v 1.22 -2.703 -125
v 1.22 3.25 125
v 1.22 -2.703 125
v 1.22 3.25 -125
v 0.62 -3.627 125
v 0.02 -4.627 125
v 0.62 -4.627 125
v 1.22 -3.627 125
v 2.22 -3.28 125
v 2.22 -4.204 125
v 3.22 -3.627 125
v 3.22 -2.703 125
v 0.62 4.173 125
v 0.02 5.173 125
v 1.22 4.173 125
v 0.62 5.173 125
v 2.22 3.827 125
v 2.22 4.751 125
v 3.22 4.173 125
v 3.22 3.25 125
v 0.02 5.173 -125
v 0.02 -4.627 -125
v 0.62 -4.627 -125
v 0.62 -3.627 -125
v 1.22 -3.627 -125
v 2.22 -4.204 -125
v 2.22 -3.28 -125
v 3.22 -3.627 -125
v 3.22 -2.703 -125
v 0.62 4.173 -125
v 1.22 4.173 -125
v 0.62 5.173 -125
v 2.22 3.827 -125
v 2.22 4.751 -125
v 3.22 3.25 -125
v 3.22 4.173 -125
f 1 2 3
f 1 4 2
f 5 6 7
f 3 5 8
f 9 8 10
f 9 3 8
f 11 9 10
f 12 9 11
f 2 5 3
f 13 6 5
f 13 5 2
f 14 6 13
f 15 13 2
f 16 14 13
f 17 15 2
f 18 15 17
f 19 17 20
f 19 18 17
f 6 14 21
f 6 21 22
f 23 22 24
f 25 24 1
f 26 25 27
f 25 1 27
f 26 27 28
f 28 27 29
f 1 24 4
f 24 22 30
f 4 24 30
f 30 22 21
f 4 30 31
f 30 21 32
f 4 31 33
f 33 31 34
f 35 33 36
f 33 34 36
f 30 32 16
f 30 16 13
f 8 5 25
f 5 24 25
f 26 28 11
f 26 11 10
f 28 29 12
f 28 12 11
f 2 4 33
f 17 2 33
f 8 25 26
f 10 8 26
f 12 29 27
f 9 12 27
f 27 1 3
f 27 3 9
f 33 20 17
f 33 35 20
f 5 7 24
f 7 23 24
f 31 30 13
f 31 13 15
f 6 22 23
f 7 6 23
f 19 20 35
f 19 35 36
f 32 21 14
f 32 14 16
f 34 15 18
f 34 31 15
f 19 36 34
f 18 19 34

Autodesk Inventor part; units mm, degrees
ref_plane "YZ Plane" through (0, 0, 0) normal (1, 0, 0) x (0, 1, 0)
ref_plane "XZ Plane" through (0, 0, 0) normal (0, 1, 0) x (-1, 0, 0)
ref_plane "XY Plane" through (0, 0, 0) normal (0, 0, 1) x (1, 0, 0)
sketch "Sketch1" plane through (0, 0, 0) normal (0, 0, 1) x (1, 0, 0)
  line L0 (0.0202, 5.1733) -> (0.0202, -4.6267)
  line L1 (0.6202, 5.1733) -> (0.6202, 4.1733)
  line L2 (1.2202, 3.2495) -> (1.2202, -2.703)
  line L3 (0.6202, 4.1733) -> (1.2202, 4.1733)
  line L4 (0.0202, 5.1733) -> (0.6202, 5.1733)
  line L5 (1.2202, 4.1733) -> (2.2202, 4.7506)
  line L6 (1.2202, 3.2495) -> (2.2202, 3.8268)
  line L7 (3.2202, 4.1733) -> (2.2202, 4.7506)
  line L8 (3.2202, 3.2495) -> (2.2202, 3.8268)
  line L9 (3.2202, 3.2495) -> (3.2202, 4.1733)
  line L10 (0.6202, -4.6267) -> (0.6202, -3.6267)
  line L11 (0.6202, -3.6267) -> (1.2202, -3.6267)
  line L12 (0.0202, -4.6267) -> (0.6202, -4.6267)
  line L13 (1.2202, -3.6267) -> (2.2202, -4.2041)
  line L14 (1.2202, -2.703) -> (2.2202, -3.2803)
  line L15 (3.2202, -3.6267) -> (2.2202, -4.2041)
  line L16 (3.2202, -2.703) -> (2.2202, -3.2803)
  line L17 (3.2202, -2.703) -> (3.2202, -3.6267)
  point P0 (0, 0)
  dimension "d0" = 120
  dimension "d1" = 120
  dimension "d2" = 90
  dimension "d3" = 60
  dimension "d4" = 2
  dimension "d5" = 2.6
  dimension "d6" = 3.2
  dimension "d7" = 0.8
  dimension "d8" = 6.955
  dimension "d9" = 7.755
  dimension "d10" = 0.8
  dimension "d11" = 6.955
  dimension "d12" = 6.155
  dimension "d13" = 7.8
  dimension "d14" = 1
  dimension "d15" = 8.8
  dimension "d16" = 3.2202
  dimension "d17" = 3.2202
  dimension "d18" = 5.2242
  dimension "d19" = 3.951
  dimension "d20" = 4.1733
  dimension "d21" = 0.6202
extrude "Extrusion1" add sketch "Sketch1" along normal mid plane 250
properties part number "T Slot Cover 250mm" material "PC/ABS Plastic"
